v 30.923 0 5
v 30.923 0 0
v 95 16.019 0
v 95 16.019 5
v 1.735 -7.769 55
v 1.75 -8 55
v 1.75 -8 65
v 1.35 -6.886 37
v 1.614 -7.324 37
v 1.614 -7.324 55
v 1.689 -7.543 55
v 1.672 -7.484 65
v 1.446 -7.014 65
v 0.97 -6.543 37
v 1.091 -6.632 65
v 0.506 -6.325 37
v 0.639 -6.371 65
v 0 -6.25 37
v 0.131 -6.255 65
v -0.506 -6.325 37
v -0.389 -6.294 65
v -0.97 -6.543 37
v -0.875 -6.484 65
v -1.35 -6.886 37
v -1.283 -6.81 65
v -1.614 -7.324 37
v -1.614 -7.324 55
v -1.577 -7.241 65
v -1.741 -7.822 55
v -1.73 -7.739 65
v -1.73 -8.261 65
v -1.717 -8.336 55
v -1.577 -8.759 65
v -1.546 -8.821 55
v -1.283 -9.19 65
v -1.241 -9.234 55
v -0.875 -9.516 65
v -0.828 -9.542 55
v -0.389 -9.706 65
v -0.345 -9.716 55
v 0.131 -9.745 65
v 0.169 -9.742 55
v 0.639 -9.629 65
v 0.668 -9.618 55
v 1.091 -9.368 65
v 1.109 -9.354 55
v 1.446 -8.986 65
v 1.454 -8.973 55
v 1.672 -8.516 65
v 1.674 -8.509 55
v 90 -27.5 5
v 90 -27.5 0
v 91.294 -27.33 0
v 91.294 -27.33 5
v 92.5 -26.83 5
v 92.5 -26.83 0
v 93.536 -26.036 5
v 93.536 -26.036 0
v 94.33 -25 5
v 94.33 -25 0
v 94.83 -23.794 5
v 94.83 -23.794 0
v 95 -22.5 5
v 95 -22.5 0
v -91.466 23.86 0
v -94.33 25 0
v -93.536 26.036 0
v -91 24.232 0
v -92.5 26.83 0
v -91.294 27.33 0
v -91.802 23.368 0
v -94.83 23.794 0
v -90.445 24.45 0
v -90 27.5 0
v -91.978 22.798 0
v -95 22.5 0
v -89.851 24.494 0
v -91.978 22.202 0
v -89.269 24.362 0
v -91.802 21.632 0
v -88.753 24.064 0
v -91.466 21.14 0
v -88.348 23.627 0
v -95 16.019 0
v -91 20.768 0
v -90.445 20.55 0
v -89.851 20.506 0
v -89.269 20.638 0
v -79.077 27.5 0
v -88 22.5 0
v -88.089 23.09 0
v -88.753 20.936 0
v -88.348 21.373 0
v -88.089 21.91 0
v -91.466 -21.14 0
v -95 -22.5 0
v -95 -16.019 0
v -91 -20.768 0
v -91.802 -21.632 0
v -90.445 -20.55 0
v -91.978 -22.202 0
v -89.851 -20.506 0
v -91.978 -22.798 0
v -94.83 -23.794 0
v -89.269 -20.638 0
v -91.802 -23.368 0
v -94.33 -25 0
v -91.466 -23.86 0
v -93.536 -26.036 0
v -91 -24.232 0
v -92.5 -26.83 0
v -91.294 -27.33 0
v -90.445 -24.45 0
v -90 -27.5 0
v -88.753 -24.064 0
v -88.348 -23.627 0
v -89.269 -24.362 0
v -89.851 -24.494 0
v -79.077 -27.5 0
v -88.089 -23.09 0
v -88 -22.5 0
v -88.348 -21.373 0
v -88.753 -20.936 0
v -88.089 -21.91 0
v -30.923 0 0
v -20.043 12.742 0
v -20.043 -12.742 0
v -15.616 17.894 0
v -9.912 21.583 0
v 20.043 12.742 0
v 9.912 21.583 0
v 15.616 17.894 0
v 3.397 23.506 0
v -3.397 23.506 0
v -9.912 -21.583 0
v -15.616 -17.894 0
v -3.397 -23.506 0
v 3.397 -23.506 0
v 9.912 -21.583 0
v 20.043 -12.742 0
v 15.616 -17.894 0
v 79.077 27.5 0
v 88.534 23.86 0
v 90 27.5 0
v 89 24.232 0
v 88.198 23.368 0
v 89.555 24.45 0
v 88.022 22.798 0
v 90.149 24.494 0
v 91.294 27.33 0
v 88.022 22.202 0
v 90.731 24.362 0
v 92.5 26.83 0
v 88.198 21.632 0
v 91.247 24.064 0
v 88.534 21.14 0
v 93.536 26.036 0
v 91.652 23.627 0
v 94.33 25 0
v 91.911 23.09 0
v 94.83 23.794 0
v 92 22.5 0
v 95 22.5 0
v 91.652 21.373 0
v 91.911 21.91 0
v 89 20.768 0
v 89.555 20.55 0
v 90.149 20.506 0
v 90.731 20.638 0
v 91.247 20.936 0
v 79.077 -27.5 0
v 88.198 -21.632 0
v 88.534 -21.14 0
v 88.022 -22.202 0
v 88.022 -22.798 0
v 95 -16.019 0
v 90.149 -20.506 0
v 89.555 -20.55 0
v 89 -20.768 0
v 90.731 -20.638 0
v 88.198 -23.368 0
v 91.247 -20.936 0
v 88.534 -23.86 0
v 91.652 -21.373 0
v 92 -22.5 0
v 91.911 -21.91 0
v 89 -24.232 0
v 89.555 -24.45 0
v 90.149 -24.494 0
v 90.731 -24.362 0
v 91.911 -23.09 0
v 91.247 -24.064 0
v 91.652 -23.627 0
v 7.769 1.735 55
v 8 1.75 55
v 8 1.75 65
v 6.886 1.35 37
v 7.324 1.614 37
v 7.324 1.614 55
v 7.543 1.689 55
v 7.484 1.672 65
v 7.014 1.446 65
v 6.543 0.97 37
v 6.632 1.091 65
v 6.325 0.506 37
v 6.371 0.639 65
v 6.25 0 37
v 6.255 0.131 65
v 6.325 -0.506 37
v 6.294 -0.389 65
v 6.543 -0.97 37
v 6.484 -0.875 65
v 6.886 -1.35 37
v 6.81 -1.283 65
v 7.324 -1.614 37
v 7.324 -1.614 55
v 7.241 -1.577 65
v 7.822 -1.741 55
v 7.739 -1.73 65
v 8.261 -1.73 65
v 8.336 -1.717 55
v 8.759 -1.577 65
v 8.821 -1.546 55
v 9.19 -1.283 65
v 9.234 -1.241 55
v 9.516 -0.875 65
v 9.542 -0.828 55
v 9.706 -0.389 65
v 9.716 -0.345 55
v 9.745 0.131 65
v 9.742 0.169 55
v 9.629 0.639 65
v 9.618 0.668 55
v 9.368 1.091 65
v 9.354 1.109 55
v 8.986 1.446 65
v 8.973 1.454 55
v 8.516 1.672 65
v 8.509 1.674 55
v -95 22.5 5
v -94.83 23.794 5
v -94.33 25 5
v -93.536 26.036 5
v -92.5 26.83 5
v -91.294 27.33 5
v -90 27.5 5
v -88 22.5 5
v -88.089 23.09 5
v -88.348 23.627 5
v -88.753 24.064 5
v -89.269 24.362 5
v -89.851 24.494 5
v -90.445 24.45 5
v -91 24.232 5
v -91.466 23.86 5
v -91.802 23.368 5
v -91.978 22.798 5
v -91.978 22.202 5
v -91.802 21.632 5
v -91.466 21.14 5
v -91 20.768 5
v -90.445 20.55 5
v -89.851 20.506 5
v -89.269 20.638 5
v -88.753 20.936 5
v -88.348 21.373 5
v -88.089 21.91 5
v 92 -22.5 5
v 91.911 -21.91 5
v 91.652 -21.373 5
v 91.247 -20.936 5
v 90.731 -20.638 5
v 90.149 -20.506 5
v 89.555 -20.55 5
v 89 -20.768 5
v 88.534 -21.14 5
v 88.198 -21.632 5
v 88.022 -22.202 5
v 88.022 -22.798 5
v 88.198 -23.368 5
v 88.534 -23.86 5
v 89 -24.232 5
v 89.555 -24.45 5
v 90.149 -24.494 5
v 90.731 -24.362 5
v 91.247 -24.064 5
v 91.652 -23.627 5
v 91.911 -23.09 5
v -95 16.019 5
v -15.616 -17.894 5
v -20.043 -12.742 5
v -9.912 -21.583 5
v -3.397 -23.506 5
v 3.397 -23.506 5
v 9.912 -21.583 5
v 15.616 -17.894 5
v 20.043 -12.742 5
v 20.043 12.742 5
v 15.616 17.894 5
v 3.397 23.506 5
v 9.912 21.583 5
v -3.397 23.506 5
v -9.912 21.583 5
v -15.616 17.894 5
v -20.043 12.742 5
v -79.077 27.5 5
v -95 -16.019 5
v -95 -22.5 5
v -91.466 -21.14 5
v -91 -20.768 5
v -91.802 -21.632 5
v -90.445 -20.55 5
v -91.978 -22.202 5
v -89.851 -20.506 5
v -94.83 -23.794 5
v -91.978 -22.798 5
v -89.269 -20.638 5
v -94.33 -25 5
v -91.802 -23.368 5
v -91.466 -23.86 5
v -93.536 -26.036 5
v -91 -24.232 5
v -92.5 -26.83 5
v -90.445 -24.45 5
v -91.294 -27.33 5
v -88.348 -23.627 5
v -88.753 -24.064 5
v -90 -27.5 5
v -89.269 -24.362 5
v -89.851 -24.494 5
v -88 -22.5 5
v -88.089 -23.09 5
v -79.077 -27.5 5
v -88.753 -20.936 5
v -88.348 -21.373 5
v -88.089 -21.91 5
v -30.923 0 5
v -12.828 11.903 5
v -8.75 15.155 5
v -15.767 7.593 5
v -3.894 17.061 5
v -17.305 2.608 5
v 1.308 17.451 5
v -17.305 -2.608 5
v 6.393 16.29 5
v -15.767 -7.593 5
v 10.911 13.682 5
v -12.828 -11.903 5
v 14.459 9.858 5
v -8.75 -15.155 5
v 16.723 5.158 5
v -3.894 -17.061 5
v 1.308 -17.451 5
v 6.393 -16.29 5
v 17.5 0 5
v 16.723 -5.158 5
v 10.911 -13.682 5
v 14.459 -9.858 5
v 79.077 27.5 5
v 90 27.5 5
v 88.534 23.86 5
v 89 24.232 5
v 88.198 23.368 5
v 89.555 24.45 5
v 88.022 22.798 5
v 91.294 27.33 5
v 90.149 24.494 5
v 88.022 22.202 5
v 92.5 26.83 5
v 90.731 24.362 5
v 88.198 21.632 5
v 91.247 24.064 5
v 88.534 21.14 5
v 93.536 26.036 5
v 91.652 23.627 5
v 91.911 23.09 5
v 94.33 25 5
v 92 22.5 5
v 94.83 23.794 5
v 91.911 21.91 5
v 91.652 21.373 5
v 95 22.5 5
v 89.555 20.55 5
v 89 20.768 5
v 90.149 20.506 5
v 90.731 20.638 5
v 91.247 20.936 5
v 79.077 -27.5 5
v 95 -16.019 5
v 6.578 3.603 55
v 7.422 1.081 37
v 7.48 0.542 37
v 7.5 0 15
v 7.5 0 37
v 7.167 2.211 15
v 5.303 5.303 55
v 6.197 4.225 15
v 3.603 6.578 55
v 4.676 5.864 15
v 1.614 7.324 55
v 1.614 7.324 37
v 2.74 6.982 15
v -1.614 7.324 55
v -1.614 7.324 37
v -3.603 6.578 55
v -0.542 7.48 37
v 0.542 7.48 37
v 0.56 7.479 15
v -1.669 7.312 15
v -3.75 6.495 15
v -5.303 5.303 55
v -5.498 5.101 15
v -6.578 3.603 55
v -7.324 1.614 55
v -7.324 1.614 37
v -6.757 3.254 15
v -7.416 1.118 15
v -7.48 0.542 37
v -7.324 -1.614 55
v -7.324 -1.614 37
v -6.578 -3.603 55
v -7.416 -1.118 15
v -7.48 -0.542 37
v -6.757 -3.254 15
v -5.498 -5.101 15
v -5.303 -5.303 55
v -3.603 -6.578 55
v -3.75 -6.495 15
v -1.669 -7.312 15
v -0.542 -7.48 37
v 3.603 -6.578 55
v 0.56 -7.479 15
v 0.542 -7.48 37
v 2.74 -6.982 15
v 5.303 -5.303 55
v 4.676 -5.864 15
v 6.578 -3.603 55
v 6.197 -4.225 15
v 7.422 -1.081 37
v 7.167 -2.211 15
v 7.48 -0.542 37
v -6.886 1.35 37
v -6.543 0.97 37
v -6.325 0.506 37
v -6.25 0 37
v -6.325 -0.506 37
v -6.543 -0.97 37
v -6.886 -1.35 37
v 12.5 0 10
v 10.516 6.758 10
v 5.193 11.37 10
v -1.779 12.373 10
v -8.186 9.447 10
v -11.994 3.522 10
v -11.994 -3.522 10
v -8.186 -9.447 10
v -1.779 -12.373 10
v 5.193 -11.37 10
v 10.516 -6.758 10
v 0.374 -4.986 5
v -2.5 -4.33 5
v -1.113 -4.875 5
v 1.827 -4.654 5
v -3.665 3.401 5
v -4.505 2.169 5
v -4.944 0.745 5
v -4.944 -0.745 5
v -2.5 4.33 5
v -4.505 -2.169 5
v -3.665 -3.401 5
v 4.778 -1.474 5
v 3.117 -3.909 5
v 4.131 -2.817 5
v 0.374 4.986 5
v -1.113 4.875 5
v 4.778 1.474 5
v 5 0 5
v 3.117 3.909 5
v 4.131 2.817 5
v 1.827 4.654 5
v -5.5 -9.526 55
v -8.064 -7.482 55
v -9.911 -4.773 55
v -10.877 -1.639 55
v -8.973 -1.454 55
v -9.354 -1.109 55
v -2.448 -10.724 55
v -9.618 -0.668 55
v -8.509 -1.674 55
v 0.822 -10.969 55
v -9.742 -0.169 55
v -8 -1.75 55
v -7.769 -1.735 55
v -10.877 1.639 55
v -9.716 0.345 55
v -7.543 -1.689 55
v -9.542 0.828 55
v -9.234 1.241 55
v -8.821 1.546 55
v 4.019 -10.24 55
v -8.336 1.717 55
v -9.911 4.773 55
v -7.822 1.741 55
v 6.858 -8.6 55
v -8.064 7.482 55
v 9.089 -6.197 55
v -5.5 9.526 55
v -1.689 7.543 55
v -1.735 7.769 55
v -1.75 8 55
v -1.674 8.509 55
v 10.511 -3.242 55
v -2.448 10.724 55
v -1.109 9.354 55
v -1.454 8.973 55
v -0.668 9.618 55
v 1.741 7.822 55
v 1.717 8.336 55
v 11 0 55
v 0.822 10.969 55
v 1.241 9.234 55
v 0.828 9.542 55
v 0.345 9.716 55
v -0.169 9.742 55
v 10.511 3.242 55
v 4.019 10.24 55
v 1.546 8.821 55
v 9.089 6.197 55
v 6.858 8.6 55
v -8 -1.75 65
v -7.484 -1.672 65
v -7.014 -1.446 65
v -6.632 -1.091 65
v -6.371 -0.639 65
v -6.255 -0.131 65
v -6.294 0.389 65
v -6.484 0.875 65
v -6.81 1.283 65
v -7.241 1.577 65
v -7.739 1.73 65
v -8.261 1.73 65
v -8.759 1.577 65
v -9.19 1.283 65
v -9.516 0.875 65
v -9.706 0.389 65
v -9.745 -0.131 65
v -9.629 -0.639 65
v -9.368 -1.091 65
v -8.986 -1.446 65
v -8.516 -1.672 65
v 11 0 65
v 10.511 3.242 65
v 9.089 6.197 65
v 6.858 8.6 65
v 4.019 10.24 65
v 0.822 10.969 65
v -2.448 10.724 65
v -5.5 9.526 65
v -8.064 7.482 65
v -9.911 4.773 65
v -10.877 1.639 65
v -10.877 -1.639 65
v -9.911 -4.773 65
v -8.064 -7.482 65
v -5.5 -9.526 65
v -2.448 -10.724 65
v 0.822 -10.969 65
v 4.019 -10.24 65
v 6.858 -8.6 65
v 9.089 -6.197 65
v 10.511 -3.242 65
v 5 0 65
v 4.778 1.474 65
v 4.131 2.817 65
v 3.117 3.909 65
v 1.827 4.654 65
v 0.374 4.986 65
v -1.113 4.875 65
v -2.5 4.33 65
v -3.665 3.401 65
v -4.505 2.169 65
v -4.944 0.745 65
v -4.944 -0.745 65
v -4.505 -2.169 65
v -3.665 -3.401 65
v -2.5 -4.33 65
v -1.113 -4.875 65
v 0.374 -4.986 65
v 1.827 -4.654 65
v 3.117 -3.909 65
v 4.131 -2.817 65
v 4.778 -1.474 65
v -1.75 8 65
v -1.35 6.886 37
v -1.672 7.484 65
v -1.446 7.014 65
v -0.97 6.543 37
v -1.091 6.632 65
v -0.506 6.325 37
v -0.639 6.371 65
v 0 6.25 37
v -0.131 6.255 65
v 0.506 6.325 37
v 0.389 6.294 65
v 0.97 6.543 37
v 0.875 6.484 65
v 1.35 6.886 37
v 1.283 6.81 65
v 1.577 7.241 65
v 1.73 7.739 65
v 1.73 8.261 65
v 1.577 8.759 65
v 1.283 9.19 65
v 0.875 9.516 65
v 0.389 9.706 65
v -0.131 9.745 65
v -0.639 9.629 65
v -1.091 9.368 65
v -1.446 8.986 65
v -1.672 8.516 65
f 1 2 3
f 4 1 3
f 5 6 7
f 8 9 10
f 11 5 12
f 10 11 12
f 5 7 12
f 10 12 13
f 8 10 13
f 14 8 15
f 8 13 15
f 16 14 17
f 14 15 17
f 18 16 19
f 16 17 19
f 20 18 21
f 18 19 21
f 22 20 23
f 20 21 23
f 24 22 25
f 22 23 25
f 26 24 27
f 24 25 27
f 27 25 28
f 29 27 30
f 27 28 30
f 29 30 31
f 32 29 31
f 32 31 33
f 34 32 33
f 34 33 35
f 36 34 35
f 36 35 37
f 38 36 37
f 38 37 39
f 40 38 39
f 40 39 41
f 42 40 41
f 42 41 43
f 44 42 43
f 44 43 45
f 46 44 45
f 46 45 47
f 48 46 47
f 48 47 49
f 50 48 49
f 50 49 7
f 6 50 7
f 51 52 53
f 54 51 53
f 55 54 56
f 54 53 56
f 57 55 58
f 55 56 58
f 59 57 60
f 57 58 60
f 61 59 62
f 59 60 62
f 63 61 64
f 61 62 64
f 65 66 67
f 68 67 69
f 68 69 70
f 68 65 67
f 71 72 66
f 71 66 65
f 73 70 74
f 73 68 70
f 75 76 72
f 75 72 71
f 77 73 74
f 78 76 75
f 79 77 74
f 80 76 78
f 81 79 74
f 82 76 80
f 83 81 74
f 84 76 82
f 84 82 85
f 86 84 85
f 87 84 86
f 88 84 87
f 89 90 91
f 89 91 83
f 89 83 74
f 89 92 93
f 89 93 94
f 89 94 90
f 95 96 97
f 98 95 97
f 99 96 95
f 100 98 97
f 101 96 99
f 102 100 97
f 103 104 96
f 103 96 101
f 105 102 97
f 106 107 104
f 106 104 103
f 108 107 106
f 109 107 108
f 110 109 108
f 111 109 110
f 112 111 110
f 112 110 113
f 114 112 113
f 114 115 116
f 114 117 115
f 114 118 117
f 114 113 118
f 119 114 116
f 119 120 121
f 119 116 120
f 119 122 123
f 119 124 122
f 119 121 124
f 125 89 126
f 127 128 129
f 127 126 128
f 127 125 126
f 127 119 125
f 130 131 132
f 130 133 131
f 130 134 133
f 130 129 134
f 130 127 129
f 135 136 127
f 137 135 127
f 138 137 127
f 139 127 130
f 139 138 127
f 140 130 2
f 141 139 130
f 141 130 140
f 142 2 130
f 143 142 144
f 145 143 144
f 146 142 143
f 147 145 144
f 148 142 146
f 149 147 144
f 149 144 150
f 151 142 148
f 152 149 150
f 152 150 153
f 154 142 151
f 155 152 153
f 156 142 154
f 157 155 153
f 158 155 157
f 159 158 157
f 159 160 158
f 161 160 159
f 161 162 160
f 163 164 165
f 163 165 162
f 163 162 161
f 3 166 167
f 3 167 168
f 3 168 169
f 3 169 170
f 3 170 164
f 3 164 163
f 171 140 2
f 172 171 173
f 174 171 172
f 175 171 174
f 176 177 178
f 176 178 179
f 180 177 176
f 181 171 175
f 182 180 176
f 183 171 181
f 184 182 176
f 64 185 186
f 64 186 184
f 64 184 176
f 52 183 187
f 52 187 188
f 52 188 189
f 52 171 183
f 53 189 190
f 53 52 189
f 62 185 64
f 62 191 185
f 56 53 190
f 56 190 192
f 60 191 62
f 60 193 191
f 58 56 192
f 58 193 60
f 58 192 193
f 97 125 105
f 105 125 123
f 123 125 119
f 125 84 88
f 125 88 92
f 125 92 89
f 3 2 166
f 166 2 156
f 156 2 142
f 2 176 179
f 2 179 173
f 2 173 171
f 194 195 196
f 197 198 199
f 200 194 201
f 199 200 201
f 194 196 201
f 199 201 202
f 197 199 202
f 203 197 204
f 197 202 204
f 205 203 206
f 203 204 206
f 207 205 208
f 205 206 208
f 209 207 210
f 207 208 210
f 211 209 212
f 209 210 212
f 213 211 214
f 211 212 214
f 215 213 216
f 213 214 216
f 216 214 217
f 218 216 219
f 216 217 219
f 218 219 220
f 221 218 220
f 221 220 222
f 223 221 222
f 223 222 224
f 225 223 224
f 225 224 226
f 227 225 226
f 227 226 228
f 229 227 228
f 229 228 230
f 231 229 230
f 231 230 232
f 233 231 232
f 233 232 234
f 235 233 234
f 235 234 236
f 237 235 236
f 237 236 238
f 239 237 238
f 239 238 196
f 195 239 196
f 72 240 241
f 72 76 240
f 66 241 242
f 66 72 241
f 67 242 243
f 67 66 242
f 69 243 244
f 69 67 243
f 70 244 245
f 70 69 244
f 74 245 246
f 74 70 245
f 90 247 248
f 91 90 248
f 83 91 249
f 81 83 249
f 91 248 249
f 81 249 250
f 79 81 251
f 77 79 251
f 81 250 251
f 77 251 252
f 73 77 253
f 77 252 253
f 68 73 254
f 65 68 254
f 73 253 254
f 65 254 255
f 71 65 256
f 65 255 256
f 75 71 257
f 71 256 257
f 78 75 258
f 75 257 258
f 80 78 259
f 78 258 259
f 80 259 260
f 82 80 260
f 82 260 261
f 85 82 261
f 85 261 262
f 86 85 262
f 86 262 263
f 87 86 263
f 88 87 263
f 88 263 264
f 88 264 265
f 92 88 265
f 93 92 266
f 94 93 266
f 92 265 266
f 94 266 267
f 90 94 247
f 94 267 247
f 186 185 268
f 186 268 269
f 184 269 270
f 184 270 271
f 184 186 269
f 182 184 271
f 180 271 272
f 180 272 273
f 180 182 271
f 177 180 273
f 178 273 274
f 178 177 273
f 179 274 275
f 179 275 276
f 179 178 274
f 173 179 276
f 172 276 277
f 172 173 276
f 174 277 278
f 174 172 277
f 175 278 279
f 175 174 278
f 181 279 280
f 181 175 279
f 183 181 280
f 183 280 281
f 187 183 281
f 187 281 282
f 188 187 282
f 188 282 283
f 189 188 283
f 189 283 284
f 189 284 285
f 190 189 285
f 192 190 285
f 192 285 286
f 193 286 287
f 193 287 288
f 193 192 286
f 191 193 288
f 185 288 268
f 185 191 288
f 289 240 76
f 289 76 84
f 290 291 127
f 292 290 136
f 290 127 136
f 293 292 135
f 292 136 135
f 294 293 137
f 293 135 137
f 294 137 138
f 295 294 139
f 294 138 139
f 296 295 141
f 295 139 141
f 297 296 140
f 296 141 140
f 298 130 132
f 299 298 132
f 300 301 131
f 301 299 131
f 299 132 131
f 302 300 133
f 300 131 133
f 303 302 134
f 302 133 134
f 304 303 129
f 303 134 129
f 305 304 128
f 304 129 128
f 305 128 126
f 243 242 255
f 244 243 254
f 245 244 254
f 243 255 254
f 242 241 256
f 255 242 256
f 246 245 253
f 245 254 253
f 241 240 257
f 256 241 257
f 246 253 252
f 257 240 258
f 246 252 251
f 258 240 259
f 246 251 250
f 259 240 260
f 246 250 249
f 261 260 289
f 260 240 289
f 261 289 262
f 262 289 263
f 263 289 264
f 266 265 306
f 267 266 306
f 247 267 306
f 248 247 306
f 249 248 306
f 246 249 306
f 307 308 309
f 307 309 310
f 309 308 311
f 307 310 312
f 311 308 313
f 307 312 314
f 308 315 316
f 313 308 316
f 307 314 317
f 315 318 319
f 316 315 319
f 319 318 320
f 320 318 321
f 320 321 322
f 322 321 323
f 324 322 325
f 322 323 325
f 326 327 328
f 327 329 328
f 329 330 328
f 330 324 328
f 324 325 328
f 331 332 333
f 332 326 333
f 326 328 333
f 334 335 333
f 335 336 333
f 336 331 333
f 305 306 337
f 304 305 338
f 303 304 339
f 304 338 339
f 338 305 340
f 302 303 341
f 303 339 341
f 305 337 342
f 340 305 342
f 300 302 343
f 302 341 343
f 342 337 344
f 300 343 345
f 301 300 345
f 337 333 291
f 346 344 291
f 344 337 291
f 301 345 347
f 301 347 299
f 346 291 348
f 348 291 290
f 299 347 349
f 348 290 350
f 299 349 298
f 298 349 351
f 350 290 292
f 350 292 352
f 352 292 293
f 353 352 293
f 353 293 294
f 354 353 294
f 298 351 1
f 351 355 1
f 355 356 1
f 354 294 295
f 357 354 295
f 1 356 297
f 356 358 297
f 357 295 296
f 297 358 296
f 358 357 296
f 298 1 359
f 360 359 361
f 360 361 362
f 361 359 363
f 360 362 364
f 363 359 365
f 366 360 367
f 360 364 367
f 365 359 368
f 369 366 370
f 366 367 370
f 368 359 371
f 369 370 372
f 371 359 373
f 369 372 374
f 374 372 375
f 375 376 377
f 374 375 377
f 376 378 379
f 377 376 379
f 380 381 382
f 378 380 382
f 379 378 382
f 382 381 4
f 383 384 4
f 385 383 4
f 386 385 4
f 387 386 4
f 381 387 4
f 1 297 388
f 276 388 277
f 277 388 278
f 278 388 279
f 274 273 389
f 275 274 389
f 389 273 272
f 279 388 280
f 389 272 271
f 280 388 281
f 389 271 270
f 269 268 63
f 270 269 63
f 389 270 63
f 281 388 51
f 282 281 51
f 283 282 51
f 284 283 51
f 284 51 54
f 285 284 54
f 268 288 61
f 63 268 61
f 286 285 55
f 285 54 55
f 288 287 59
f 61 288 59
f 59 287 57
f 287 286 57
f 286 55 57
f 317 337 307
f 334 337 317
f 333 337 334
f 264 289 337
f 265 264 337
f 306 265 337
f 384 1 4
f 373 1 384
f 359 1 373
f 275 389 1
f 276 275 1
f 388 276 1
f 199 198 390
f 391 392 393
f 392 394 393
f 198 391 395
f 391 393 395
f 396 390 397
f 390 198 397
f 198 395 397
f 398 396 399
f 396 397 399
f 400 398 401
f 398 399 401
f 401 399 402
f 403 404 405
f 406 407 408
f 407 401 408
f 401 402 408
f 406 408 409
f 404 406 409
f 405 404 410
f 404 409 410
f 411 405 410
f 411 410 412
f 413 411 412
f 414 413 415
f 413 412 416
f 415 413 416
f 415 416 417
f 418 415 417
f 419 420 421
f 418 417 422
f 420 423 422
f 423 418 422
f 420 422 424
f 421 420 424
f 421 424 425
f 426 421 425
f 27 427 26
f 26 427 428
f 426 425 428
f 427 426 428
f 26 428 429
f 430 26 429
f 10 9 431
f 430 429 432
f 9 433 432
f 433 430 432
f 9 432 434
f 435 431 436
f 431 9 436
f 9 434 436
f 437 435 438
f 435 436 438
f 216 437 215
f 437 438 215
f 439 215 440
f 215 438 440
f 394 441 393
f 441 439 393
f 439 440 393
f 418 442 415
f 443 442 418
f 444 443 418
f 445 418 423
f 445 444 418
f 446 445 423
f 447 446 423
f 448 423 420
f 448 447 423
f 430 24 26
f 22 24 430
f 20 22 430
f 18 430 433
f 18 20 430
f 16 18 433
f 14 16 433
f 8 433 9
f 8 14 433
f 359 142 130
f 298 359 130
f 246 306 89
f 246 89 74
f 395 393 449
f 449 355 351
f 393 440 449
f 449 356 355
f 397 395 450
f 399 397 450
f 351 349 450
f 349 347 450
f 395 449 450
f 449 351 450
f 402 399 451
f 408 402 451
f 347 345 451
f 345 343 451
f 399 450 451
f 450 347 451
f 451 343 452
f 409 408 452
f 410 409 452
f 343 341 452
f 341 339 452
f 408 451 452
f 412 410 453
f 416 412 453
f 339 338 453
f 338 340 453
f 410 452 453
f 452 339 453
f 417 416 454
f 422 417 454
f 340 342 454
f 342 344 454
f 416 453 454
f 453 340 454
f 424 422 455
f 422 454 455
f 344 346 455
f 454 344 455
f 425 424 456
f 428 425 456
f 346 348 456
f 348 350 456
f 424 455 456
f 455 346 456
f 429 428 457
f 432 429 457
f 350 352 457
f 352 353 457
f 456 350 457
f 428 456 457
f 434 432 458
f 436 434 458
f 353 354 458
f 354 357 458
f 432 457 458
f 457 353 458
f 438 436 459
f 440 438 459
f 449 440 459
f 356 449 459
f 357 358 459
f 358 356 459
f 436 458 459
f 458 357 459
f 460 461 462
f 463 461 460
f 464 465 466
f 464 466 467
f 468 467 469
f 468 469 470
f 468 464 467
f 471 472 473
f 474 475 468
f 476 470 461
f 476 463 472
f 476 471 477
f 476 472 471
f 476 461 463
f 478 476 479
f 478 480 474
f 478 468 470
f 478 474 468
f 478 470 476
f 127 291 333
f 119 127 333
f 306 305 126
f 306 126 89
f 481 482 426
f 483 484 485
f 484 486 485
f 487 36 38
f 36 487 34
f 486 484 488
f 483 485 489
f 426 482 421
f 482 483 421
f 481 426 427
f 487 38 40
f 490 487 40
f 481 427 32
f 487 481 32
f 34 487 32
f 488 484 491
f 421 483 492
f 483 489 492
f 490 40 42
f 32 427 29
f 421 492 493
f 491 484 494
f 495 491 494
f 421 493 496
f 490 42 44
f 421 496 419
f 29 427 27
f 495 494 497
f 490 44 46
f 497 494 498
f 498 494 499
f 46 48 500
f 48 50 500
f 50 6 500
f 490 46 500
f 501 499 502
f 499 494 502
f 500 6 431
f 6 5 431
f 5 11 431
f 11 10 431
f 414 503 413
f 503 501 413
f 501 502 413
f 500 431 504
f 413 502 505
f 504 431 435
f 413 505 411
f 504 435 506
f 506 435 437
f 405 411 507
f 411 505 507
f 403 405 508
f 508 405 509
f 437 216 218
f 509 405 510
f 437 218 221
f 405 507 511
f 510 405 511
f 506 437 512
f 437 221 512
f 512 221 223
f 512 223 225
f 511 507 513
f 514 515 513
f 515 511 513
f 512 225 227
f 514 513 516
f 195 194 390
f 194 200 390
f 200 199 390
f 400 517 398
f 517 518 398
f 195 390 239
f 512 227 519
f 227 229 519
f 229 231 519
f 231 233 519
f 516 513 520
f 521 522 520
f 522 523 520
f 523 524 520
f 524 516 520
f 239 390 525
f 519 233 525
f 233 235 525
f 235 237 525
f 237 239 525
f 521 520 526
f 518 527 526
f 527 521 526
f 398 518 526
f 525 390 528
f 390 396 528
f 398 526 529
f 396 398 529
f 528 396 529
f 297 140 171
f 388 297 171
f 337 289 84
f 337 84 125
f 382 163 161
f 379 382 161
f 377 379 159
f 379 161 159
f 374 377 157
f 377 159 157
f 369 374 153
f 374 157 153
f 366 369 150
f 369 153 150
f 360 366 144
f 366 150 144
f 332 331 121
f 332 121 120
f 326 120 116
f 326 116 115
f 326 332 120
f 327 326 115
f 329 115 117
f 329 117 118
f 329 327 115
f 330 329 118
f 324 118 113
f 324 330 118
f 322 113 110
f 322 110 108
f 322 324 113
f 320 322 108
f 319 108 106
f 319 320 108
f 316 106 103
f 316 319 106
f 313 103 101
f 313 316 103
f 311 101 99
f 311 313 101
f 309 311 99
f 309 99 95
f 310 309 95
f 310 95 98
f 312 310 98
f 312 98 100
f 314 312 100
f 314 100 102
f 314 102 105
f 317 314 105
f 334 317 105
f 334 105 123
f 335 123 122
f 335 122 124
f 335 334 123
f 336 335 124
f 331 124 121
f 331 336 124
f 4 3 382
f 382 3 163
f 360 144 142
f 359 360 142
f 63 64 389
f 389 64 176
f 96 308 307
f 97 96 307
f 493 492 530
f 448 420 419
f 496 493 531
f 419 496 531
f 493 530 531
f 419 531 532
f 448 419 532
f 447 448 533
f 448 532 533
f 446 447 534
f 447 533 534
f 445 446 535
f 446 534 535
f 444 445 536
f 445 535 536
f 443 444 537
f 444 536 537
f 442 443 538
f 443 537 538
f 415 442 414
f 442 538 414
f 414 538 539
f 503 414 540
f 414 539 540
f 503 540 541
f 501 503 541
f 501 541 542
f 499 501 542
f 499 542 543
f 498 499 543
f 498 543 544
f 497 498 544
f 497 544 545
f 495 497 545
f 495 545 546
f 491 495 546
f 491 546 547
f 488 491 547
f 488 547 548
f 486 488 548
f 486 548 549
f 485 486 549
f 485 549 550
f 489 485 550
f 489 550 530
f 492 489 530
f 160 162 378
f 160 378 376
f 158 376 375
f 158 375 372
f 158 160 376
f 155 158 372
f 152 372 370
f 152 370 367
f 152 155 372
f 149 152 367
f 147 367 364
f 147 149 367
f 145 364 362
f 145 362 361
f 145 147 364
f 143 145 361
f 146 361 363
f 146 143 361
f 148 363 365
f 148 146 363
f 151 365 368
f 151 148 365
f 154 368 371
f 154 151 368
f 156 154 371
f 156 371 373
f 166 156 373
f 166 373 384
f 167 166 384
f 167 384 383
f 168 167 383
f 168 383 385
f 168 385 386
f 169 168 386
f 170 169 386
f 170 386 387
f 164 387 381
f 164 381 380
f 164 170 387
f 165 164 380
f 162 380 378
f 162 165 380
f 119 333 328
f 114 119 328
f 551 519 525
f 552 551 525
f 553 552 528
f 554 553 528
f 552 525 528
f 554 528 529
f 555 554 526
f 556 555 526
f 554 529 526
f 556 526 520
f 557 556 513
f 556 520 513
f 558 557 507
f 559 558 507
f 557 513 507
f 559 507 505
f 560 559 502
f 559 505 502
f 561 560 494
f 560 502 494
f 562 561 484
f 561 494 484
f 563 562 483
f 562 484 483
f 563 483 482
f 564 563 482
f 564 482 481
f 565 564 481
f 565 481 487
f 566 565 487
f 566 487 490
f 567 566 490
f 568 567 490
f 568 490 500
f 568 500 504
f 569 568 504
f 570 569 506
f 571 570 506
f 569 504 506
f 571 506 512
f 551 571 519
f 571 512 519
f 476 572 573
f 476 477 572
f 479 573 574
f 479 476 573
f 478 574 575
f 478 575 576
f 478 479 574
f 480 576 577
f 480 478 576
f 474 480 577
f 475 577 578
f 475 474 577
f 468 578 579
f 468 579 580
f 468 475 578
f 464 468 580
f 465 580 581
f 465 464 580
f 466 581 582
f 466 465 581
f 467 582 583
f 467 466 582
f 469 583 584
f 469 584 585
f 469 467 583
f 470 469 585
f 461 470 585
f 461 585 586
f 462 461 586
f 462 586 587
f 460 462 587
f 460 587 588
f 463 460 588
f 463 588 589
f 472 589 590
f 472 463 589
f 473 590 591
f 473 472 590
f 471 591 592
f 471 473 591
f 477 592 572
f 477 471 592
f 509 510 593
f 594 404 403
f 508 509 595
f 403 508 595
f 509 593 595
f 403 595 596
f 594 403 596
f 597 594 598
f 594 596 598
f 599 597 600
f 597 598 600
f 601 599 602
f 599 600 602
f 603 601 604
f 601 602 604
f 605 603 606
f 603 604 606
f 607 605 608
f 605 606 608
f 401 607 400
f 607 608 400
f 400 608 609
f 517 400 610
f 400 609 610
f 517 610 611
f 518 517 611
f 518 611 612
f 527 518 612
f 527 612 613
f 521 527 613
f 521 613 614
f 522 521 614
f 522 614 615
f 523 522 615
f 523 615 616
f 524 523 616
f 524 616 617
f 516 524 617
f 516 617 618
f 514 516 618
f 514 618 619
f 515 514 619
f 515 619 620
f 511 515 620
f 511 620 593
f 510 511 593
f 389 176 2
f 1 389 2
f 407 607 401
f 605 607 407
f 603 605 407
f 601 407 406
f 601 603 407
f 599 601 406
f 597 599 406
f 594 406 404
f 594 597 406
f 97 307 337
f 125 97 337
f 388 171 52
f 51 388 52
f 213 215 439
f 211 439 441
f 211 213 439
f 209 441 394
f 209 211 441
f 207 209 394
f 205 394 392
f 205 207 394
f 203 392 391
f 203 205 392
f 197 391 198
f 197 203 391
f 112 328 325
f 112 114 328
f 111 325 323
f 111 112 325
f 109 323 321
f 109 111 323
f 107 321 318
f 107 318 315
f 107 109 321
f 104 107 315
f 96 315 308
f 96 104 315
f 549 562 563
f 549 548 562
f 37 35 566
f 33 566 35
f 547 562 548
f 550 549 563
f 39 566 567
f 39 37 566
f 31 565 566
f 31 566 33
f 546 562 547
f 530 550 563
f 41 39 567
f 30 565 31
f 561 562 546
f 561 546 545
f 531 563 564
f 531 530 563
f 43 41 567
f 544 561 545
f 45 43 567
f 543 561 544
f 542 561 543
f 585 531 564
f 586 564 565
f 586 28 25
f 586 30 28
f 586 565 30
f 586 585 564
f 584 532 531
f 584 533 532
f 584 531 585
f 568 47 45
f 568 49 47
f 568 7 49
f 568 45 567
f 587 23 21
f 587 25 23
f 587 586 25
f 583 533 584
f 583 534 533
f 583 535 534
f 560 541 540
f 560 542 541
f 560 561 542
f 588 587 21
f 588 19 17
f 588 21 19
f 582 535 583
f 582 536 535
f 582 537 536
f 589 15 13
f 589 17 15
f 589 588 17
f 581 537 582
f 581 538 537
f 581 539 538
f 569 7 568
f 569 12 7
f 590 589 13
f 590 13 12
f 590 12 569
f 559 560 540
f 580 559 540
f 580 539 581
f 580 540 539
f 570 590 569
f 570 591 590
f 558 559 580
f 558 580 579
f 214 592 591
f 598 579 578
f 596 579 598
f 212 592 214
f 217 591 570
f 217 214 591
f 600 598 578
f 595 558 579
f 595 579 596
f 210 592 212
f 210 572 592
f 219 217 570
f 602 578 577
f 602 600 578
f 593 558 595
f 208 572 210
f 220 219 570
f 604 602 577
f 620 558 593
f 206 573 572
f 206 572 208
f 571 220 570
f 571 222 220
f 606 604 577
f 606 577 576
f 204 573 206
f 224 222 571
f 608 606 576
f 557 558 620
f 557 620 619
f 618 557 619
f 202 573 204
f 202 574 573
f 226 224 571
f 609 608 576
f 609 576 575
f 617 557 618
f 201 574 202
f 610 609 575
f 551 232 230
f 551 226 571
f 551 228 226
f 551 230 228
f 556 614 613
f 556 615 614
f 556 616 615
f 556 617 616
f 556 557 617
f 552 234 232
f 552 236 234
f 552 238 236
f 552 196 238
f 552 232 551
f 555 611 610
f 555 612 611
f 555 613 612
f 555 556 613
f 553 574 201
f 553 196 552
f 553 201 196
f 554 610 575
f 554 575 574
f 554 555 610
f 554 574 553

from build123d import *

# Parameters (mm, degrees)
ESBO_O1_R                = 23.75
RESSALTO_EXTRUS_O1_DEPTH = 5
ESBO_O8_R                = 2
RESSALTO_EXTRUS_O2_DEPTH = 5
ESBO_O9_R                = 7.5
ESBO_O9_R_2              = 5
RESSALTO_EXTRUS_O3_DEPTH = 60
RESSALTO_EXTRUS_O4_START = -10
ESBO_O10_R               = 11
ESBO_O10_R_2             = 5
RESSALTO_EXTRUS_O4_DEPTH = 10
ESBO_O11_R               = 1.75
CORTE_EXTRUS_O1_DEPTH    = 28
PADR_OCIRCULAR2_COUNT    = 4
CHANFRO1_SIZE            = 10
FILETE1_R                = 5
FILETE1_OF_ESPELHAR4_R   = 5
ESPELHAR5_OUTLINE_R      = 2
ESPELHAR5_DEPTH          = 5


# Read off the part's stored shape, not the designer's step: Espelhar5
with BuildPart() as part:
    # Esboço1 → Ressalto-extrusão1 (new body)
    with BuildSketch(Plane.XY):
        Circle(ESBO_O1_R)
    extrude(amount=RESSALTO_EXTRUS_O1_DEPTH)

    # Esboço8 → Ressalto-extrusão2 (add)
    with BuildSketch(Plane.XY.offset(5)):
        Polygon((-20.042848617, 12.741535202), (-79.076707808, 27.5), (-95, 27.5), (-95, 16.019176952), (-23.680882993, -1.8106023), align=None)
        with Locations((-90, 22.5)):
            Circle(ESBO_O8_R, mode=Mode.SUBTRACT)
    ressalto_extrus_o2 = extrude(amount=-RESSALTO_EXTRUS_O2_DEPTH)

    # Esboço9 → Ressalto-extrusão3 (add)
    with BuildSketch(Plane.XY.offset(5)):
        Circle(ESBO_O9_R)
        Circle(ESBO_O9_R_2, mode=Mode.SUBTRACT)
    extrude(amount=RESSALTO_EXTRUS_O3_DEPTH)

    # Esboço10 → Ressalto-extrusão4 (add)
    with BuildSketch(Plane.XY.offset(65).offset(RESSALTO_EXTRUS_O4_START)):
        Circle(ESBO_O10_R)
        Circle(ESBO_O10_R_2, mode=Mode.SUBTRACT)
    extrude(amount=RESSALTO_EXTRUS_O4_DEPTH)

    # Esboço11 → Corte-extrusão1 (cut)
    with BuildSketch(Plane.XY.offset(65)):
        with Locations((0, -8)):
            Circle(ESBO_O11_R)
    corte_extrus_o1 = extrude(amount=-CORTE_EXTRUS_O1_DEPTH, mode=Mode.SUBTRACT)

    # PadrãoCircular2: Corte-extrusão1 ×4 about axis
    padr_ocircular2_axis = Axis((0, 0, 0), (0, 0, 1))
    for i in range(1, PADR_OCIRCULAR2_COUNT):
        add(corte_extrus_o1.rotate(padr_ocircular2_axis, i * 360 / PADR_OCIRCULAR2_COUNT), mode=Mode.SUBTRACT)

    # Chanfro1
    chanfro1_edges = [part.edges().sort_by_distance(p)[0] for p in [
        (-7.5, 0, 5),
    ]]
    chamfer(chanfro1_edges, length=CHANFRO1_SIZE)

    # Filete1
    filete1_edges = [part.edges().sort_by_distance(p)[0] for p in [
        (-95, 27.5, 2.5),
    ]]
    fillet(filete1_edges, radius=FILETE1_R)

    # Espelhar4: Ressalto-extrusão2 across plane
    add(ressalto_extrus_o2.mirror(Plane.ZX))

    # Filete1 of Espelhar4
    filete1_of_espelhar4_edges = [part.edges().sort_by_distance(p)[0] for p in [
        (-95, -27.5, 2.5),
    ]]
    fillet(filete1_of_espelhar4_edges, radius=FILETE1_OF_ESPELHAR4_R)

    # Espelhar5 outline → Espelhar5 (add)
    with BuildSketch(Plane.XY):
        with BuildLine():
            Line((95, -22.5), (95, -16.019176952))
            Line((95, -16.019176952), (30.923292192, 0))
            Line((30.923292192, 0), (95, 16.019176952))
            Line((95, 16.019176952), (95, 22.5))
            ThreePointArc((95, 22.5), (93.535533906, 26.035533906), (90, 27.5))
            Line((90, 27.5), (79.076707808, 27.5))
            Line((79.076707808, 27.5), (20.042848617, 12.741535202))
            ThreePointArc((20.042848617, 12.741535202), (23.75, 0), (20.042848617, -12.741535202))
            Line((20.042848617, -12.741535202), (79.076707808, -27.5))
            Line((79.076707808, -27.5), (90, -27.5))
            ThreePointArc((90, -27.5), (93.535533906, -26.035533906), (95, -22.5))
        make_face()
        with Locations((90, -22.5)):
            Circle(ESPELHAR5_OUTLINE_R, mode=Mode.SUBTRACT)
        with Locations((90, 22.5)):
            Circle(ESPELHAR5_OUTLINE_R, mode=Mode.SUBTRACT)
    extrude(amount=ESPELHAR5_DEPTH)


solid = part.part
